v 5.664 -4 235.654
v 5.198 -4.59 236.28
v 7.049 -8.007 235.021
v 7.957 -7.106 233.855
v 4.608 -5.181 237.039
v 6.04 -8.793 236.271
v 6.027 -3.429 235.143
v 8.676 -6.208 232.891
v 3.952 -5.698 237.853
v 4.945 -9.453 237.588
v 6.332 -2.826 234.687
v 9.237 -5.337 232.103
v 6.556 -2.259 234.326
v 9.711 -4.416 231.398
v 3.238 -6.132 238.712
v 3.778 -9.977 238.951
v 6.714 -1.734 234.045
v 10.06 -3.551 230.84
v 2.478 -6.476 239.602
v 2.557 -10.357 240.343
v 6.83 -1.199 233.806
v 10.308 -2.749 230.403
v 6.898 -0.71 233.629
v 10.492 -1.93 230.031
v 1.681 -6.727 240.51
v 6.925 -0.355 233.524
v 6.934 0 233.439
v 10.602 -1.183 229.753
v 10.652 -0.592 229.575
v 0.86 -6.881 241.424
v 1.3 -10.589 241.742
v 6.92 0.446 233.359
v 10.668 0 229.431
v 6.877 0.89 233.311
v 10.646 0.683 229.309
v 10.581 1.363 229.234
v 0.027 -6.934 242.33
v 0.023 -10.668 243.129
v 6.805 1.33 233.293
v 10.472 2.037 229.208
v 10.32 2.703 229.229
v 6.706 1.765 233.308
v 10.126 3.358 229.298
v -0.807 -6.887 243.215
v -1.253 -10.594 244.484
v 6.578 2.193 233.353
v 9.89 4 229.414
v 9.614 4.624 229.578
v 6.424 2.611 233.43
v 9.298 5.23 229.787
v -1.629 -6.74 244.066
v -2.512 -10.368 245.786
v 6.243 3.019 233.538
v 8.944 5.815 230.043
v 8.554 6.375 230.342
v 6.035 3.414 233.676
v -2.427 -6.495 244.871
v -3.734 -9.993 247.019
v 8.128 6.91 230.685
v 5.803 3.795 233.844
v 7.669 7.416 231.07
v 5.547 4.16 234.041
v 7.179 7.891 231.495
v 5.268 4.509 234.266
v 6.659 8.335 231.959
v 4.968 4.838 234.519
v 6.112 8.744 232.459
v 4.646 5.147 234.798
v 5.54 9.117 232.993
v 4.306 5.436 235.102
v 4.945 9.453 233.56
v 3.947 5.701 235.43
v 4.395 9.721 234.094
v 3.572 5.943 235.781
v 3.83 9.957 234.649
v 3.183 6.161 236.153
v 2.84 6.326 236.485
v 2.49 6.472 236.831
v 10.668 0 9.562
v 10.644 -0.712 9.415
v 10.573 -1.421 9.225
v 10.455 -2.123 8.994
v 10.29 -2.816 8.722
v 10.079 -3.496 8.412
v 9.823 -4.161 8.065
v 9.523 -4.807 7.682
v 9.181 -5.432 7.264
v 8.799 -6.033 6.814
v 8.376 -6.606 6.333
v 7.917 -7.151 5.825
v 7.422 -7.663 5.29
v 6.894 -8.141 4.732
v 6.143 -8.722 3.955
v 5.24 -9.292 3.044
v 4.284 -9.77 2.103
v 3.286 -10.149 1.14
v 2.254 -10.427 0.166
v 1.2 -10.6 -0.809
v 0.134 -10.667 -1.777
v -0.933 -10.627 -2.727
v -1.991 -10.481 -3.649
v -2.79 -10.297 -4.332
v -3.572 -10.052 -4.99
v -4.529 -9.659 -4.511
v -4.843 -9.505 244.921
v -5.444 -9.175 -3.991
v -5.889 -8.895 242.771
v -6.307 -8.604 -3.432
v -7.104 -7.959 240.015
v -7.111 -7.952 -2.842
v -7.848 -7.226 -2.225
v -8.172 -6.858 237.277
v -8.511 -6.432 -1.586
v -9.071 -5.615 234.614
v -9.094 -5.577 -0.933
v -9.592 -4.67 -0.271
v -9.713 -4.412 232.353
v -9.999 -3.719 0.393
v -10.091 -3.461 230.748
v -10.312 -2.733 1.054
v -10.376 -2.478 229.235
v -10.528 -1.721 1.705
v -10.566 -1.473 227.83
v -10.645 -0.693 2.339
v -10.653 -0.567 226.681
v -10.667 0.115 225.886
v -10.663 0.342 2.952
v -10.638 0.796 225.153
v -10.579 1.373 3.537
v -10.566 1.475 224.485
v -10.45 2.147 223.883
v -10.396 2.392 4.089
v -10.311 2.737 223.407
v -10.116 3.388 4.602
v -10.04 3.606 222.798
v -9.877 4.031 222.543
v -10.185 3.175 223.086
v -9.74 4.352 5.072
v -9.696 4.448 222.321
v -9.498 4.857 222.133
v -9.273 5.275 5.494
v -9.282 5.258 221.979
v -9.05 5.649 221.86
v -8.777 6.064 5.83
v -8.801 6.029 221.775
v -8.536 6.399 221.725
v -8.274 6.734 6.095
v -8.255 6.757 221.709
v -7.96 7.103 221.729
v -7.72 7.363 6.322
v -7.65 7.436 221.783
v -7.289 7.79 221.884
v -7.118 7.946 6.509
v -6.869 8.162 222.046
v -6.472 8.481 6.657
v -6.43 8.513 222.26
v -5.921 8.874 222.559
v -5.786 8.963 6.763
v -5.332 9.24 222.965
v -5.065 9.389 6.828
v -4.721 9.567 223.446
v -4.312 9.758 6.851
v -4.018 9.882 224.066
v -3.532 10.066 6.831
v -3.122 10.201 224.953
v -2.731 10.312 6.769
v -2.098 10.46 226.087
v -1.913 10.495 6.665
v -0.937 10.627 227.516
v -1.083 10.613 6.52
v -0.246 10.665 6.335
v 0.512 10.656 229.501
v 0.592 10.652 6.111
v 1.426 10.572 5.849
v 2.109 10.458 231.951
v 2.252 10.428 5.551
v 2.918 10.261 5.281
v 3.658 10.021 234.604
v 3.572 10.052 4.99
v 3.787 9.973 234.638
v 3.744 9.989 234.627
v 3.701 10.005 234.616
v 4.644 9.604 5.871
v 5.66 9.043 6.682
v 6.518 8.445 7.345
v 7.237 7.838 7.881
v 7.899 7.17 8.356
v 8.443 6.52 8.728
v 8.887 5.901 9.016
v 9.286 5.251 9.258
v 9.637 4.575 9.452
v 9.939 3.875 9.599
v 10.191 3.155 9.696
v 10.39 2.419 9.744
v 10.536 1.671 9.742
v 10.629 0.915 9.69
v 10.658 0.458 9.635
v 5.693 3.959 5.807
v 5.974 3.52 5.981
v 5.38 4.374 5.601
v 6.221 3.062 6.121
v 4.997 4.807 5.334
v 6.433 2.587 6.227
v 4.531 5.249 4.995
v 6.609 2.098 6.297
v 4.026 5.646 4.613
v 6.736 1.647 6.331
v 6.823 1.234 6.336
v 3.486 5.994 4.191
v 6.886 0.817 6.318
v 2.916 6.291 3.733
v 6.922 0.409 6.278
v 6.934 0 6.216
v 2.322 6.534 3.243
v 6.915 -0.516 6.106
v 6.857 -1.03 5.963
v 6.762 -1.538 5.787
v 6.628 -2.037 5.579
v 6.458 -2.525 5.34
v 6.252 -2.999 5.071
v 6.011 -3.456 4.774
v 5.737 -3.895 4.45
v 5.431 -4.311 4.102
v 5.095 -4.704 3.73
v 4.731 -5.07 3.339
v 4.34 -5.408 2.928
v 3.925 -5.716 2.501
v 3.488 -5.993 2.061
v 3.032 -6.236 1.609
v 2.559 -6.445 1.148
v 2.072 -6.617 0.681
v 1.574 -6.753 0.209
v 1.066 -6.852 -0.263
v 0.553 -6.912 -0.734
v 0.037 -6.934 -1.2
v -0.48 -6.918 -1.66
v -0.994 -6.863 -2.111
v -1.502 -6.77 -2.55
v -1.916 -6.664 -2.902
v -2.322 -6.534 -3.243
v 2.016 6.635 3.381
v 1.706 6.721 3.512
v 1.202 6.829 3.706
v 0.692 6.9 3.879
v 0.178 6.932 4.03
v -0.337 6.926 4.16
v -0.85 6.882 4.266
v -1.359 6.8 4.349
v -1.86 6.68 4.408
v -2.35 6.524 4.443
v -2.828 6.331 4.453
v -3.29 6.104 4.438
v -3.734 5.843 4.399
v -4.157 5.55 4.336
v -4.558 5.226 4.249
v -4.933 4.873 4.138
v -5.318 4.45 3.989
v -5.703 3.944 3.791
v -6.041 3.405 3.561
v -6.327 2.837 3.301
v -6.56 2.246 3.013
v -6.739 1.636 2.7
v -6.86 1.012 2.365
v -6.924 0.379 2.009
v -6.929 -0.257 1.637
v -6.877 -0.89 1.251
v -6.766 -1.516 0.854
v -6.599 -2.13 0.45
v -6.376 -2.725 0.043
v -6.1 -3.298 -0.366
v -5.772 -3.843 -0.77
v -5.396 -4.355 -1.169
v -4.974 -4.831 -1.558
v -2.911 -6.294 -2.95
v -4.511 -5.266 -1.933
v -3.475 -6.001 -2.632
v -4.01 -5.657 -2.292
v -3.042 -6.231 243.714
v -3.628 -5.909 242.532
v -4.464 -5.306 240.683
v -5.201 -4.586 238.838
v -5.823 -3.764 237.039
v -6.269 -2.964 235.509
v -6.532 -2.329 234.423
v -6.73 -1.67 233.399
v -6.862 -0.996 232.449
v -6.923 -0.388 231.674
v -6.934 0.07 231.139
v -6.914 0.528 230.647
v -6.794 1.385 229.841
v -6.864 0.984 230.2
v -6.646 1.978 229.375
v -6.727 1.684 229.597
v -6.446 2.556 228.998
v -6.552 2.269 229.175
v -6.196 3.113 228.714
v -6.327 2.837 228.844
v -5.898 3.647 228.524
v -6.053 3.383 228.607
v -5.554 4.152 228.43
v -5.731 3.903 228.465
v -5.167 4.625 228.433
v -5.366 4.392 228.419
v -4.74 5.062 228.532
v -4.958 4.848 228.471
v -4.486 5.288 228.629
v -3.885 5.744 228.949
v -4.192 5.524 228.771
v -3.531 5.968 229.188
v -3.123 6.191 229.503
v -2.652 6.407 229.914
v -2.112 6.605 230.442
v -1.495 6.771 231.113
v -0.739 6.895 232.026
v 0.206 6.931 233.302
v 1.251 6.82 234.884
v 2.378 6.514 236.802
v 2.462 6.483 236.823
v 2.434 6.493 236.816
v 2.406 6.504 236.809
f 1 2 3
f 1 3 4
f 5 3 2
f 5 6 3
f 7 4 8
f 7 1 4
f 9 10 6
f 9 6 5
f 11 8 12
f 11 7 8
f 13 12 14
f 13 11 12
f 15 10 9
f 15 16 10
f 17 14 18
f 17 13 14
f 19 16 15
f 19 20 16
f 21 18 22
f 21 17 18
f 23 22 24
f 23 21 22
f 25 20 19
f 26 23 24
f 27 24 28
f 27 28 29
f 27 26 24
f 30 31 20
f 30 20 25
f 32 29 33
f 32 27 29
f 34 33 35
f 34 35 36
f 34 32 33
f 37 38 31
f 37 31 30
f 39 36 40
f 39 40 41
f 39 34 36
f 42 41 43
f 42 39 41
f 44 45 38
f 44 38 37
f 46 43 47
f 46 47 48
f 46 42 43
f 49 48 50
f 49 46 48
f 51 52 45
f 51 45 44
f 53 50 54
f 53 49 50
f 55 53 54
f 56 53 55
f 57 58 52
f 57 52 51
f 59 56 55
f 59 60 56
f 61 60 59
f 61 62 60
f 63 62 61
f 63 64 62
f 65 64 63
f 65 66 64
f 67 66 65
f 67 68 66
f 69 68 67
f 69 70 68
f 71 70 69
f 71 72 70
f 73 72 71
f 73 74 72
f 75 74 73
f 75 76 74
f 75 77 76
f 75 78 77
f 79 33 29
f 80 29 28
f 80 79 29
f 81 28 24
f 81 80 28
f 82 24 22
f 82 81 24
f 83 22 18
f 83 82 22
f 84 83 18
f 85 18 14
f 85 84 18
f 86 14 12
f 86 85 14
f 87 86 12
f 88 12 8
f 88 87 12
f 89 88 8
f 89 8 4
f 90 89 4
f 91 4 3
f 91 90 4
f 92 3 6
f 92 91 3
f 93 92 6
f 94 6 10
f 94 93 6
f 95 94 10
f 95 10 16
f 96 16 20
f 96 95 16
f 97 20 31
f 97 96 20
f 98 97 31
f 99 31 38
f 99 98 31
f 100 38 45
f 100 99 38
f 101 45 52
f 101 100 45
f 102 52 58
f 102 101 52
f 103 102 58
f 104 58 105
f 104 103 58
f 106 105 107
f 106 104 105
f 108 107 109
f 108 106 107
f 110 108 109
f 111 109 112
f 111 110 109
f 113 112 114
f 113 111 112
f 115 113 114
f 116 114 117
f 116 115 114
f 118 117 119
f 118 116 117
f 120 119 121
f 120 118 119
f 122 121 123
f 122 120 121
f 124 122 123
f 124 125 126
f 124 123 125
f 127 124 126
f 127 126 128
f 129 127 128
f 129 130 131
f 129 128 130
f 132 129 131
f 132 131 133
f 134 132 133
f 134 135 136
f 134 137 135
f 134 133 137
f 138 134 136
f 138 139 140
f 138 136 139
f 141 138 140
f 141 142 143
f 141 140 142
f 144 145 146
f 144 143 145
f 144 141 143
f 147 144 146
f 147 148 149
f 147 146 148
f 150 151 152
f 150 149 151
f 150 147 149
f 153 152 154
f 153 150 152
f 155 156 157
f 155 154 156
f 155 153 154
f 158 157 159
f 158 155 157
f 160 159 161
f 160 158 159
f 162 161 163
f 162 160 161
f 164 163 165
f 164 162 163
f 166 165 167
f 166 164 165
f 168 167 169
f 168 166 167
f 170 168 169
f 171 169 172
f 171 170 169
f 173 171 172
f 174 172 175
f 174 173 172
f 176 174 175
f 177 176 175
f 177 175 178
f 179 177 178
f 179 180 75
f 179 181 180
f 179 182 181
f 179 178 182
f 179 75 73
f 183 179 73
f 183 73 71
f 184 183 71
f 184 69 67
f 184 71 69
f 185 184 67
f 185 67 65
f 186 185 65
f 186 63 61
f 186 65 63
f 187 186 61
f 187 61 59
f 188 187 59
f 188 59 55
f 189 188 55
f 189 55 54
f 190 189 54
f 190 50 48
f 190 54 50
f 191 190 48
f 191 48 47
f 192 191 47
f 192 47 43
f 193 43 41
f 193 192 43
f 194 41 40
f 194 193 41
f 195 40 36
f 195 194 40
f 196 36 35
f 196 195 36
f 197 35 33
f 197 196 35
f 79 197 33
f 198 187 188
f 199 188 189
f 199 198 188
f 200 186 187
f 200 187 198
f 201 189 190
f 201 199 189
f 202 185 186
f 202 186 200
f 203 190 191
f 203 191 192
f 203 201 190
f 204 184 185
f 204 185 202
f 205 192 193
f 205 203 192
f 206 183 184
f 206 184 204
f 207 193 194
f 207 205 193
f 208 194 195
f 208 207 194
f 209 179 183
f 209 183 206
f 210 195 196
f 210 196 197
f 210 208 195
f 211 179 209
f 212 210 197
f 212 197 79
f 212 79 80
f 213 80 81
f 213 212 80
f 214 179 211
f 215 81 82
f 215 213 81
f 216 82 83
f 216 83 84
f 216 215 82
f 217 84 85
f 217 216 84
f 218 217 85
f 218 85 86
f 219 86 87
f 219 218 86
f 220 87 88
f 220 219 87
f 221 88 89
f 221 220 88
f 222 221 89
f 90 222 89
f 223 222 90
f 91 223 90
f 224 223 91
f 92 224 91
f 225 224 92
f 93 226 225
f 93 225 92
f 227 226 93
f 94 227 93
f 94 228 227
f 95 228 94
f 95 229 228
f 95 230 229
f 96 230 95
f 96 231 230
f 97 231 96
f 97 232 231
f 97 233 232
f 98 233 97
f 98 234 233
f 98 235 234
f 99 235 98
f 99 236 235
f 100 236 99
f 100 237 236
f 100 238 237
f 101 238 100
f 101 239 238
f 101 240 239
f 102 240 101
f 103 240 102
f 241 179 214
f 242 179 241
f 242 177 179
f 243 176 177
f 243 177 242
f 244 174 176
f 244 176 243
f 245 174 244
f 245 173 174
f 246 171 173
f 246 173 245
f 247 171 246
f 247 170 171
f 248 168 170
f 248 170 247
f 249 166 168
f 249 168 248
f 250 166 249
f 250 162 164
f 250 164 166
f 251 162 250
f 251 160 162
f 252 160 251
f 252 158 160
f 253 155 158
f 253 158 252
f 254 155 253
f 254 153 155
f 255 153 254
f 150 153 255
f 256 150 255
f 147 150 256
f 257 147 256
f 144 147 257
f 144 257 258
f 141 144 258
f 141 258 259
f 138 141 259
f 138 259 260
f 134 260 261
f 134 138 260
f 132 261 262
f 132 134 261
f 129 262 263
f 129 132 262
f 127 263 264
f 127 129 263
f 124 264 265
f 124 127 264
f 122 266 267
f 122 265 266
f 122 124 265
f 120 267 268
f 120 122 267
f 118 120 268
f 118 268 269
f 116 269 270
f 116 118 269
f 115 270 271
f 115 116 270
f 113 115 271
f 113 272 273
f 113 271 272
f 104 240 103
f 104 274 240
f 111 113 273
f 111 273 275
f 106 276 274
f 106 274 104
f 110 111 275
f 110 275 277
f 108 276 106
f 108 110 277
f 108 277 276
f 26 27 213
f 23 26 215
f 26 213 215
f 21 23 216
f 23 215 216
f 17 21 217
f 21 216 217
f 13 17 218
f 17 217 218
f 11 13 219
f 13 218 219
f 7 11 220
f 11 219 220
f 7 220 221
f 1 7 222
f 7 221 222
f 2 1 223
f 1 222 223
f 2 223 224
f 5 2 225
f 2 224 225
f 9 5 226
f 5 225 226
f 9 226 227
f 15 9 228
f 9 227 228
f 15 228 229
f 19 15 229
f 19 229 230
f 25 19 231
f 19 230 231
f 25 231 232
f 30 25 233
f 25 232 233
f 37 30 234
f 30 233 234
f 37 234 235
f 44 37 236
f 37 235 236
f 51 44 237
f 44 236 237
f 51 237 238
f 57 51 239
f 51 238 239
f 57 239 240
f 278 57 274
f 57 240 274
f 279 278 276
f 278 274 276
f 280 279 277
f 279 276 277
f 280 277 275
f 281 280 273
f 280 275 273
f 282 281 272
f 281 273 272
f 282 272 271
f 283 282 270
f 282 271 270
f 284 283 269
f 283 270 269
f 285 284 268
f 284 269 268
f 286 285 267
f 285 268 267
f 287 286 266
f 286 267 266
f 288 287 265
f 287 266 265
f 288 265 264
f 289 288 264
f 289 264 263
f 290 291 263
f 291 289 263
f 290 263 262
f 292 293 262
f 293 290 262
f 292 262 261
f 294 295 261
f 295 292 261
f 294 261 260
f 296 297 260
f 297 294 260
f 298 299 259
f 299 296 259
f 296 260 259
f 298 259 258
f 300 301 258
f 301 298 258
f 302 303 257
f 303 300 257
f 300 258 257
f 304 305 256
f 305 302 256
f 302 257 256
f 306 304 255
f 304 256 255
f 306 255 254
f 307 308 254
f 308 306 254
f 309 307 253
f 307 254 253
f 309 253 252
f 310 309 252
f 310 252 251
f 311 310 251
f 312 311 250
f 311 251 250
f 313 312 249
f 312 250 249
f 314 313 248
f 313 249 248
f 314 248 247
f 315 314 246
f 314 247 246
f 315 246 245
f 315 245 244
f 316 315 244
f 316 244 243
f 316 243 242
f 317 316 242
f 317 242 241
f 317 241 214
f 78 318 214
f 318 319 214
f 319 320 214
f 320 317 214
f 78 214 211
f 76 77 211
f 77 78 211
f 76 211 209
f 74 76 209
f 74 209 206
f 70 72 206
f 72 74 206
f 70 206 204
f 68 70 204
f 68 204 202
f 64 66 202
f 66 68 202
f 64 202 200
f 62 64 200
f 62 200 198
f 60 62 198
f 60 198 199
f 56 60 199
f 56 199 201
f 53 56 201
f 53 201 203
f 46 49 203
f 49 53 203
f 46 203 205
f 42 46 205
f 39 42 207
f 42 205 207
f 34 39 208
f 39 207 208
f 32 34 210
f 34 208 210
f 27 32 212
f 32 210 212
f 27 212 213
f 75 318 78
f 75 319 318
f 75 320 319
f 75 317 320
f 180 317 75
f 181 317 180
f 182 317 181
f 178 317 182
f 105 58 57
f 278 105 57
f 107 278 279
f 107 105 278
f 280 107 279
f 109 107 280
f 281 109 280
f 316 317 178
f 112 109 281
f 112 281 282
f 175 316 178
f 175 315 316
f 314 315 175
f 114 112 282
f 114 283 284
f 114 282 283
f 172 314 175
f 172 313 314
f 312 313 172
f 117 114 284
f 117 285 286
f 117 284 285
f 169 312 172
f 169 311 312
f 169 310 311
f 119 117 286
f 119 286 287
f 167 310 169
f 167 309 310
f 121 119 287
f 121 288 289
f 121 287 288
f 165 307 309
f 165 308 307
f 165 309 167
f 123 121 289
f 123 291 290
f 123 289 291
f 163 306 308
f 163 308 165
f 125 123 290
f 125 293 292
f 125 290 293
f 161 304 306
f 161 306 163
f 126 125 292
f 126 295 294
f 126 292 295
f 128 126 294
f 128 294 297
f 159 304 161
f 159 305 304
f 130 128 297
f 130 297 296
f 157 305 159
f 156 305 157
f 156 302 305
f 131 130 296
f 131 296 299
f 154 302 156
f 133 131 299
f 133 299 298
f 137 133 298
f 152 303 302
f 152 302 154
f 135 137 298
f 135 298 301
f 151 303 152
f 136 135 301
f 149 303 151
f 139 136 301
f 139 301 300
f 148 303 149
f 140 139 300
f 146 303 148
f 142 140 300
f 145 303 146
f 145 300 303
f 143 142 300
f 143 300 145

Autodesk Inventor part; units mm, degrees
ref_plane "Start Plane" through (0, 0, -4.9897) normal (0, 0, 1) x (1, 0, 0)
ref_plane "End Plane" through (0, 0, 247.019) normal (0, 0, 1) x (1, 0, 0)
sketch "Sketch" plane through (0, 0, 0) normal (0, 0, 1) x (1, 0, 0)
  circle A0 centre (0, 0) radius 6.9342
  circle A1 centre (0, 0) radius 10.668
  dimension "d0" = 21.336
  dimension "d1" = 3.7338
extrude "Body" add sketch "Sketch" along normal up to surface (252.0086 mm away) from surface at -4.9897
sketch "Sketch3" plane through (0, 0, 0) normal (0, 0, 1) x (1, 0, 0)
  line L0 (0, 0) -> (10, 0)
ref_plane "Work Plane3" through (0, 0, 0) normal (0, -1, 0) x (1, 0, 0)
sketch "Sketch4" plane through (0, 0, 0) normal (0, -1, 0) x (1, 0, 0)
  line L0 (-2, -4.9897) -> (12, -4.9897)
  line L1 (-2, 247.019) -> (12, 247.019)
  dimension "d7" = 252.0086
ref_plane "Work Plane4" through (0.3845, -10.6611, 247.658) normal (-0.0193, 0.5358, 0.8441) x (0.9998, 0.0056, 0.0193)
split "Split1" plane through (0.3845, -10.6611, 247.658) removes the side toward (-0.0193, 0.5358, 0.8441)
ref_plane "Work Plane5" through (8.2715, -6.7371, 260.0533) normal (-0.6775, 0.5518, 0.4862) x (0.6911, 0.2516, 0.6775)
split "Split2" plane through (8.2715, -6.7371, 260.0533) removes the side toward (-0.6775, 0.5518, 0.4862)
ref_plane "Work Plane6" through (-10.464, -2.0762, 252.5557) normal (0.7241, 0.1437, 0.6746) x (0.6869, -0.0621, -0.7241)
split "Split3" plane through (-10.464, -2.0762, 252.5557) removes the side toward (0.7241, 0.1437, 0.6746)
ref_plane "Work Plane7" through (4.2865, -9.7689, -6.8509) normal (-0.2171, 0.4948, -0.8414) x (0.7027, 0.6776, 0.2171)
split "Split4" plane through (4.2865, -9.7689, -6.8509) removes the side toward (-0.2171, 0.4948, -0.8414)
ref_plane "Work Plane8" through (-10.464, -2.0762, -9.7489) normal (0.6617, 0.1313, -0.7382) x (-0.6724, -0.3318, -0.6617)
split "Split5" plane through (-10.464, -2.0762, -9.7489) removes the side toward (0.6617, 0.1313, -0.7382)
equation "\"d0\" = G_H"
equation "\"d1\" = G_T"
equation "\"d2\" = G_L"
equation "\"G_H\" = 21.336"
equation "\"G_T\" = 3.7338"
equation "\"G_L\" = 252.00863"
equation "\"G_OFFSET_START\" = 4.98966"
equation "\"G_OFFSET_END\" = 6.137"
equation "\"d4\" = -G_OFFSET_START"
equation "\"d5\" = G_OFFSET_END + B_L"
equation "\"B_L\" = 240.88196"
properties part number "ANSI - 1/2 x 0.147 - 9.922" material "Steel, Mild"
